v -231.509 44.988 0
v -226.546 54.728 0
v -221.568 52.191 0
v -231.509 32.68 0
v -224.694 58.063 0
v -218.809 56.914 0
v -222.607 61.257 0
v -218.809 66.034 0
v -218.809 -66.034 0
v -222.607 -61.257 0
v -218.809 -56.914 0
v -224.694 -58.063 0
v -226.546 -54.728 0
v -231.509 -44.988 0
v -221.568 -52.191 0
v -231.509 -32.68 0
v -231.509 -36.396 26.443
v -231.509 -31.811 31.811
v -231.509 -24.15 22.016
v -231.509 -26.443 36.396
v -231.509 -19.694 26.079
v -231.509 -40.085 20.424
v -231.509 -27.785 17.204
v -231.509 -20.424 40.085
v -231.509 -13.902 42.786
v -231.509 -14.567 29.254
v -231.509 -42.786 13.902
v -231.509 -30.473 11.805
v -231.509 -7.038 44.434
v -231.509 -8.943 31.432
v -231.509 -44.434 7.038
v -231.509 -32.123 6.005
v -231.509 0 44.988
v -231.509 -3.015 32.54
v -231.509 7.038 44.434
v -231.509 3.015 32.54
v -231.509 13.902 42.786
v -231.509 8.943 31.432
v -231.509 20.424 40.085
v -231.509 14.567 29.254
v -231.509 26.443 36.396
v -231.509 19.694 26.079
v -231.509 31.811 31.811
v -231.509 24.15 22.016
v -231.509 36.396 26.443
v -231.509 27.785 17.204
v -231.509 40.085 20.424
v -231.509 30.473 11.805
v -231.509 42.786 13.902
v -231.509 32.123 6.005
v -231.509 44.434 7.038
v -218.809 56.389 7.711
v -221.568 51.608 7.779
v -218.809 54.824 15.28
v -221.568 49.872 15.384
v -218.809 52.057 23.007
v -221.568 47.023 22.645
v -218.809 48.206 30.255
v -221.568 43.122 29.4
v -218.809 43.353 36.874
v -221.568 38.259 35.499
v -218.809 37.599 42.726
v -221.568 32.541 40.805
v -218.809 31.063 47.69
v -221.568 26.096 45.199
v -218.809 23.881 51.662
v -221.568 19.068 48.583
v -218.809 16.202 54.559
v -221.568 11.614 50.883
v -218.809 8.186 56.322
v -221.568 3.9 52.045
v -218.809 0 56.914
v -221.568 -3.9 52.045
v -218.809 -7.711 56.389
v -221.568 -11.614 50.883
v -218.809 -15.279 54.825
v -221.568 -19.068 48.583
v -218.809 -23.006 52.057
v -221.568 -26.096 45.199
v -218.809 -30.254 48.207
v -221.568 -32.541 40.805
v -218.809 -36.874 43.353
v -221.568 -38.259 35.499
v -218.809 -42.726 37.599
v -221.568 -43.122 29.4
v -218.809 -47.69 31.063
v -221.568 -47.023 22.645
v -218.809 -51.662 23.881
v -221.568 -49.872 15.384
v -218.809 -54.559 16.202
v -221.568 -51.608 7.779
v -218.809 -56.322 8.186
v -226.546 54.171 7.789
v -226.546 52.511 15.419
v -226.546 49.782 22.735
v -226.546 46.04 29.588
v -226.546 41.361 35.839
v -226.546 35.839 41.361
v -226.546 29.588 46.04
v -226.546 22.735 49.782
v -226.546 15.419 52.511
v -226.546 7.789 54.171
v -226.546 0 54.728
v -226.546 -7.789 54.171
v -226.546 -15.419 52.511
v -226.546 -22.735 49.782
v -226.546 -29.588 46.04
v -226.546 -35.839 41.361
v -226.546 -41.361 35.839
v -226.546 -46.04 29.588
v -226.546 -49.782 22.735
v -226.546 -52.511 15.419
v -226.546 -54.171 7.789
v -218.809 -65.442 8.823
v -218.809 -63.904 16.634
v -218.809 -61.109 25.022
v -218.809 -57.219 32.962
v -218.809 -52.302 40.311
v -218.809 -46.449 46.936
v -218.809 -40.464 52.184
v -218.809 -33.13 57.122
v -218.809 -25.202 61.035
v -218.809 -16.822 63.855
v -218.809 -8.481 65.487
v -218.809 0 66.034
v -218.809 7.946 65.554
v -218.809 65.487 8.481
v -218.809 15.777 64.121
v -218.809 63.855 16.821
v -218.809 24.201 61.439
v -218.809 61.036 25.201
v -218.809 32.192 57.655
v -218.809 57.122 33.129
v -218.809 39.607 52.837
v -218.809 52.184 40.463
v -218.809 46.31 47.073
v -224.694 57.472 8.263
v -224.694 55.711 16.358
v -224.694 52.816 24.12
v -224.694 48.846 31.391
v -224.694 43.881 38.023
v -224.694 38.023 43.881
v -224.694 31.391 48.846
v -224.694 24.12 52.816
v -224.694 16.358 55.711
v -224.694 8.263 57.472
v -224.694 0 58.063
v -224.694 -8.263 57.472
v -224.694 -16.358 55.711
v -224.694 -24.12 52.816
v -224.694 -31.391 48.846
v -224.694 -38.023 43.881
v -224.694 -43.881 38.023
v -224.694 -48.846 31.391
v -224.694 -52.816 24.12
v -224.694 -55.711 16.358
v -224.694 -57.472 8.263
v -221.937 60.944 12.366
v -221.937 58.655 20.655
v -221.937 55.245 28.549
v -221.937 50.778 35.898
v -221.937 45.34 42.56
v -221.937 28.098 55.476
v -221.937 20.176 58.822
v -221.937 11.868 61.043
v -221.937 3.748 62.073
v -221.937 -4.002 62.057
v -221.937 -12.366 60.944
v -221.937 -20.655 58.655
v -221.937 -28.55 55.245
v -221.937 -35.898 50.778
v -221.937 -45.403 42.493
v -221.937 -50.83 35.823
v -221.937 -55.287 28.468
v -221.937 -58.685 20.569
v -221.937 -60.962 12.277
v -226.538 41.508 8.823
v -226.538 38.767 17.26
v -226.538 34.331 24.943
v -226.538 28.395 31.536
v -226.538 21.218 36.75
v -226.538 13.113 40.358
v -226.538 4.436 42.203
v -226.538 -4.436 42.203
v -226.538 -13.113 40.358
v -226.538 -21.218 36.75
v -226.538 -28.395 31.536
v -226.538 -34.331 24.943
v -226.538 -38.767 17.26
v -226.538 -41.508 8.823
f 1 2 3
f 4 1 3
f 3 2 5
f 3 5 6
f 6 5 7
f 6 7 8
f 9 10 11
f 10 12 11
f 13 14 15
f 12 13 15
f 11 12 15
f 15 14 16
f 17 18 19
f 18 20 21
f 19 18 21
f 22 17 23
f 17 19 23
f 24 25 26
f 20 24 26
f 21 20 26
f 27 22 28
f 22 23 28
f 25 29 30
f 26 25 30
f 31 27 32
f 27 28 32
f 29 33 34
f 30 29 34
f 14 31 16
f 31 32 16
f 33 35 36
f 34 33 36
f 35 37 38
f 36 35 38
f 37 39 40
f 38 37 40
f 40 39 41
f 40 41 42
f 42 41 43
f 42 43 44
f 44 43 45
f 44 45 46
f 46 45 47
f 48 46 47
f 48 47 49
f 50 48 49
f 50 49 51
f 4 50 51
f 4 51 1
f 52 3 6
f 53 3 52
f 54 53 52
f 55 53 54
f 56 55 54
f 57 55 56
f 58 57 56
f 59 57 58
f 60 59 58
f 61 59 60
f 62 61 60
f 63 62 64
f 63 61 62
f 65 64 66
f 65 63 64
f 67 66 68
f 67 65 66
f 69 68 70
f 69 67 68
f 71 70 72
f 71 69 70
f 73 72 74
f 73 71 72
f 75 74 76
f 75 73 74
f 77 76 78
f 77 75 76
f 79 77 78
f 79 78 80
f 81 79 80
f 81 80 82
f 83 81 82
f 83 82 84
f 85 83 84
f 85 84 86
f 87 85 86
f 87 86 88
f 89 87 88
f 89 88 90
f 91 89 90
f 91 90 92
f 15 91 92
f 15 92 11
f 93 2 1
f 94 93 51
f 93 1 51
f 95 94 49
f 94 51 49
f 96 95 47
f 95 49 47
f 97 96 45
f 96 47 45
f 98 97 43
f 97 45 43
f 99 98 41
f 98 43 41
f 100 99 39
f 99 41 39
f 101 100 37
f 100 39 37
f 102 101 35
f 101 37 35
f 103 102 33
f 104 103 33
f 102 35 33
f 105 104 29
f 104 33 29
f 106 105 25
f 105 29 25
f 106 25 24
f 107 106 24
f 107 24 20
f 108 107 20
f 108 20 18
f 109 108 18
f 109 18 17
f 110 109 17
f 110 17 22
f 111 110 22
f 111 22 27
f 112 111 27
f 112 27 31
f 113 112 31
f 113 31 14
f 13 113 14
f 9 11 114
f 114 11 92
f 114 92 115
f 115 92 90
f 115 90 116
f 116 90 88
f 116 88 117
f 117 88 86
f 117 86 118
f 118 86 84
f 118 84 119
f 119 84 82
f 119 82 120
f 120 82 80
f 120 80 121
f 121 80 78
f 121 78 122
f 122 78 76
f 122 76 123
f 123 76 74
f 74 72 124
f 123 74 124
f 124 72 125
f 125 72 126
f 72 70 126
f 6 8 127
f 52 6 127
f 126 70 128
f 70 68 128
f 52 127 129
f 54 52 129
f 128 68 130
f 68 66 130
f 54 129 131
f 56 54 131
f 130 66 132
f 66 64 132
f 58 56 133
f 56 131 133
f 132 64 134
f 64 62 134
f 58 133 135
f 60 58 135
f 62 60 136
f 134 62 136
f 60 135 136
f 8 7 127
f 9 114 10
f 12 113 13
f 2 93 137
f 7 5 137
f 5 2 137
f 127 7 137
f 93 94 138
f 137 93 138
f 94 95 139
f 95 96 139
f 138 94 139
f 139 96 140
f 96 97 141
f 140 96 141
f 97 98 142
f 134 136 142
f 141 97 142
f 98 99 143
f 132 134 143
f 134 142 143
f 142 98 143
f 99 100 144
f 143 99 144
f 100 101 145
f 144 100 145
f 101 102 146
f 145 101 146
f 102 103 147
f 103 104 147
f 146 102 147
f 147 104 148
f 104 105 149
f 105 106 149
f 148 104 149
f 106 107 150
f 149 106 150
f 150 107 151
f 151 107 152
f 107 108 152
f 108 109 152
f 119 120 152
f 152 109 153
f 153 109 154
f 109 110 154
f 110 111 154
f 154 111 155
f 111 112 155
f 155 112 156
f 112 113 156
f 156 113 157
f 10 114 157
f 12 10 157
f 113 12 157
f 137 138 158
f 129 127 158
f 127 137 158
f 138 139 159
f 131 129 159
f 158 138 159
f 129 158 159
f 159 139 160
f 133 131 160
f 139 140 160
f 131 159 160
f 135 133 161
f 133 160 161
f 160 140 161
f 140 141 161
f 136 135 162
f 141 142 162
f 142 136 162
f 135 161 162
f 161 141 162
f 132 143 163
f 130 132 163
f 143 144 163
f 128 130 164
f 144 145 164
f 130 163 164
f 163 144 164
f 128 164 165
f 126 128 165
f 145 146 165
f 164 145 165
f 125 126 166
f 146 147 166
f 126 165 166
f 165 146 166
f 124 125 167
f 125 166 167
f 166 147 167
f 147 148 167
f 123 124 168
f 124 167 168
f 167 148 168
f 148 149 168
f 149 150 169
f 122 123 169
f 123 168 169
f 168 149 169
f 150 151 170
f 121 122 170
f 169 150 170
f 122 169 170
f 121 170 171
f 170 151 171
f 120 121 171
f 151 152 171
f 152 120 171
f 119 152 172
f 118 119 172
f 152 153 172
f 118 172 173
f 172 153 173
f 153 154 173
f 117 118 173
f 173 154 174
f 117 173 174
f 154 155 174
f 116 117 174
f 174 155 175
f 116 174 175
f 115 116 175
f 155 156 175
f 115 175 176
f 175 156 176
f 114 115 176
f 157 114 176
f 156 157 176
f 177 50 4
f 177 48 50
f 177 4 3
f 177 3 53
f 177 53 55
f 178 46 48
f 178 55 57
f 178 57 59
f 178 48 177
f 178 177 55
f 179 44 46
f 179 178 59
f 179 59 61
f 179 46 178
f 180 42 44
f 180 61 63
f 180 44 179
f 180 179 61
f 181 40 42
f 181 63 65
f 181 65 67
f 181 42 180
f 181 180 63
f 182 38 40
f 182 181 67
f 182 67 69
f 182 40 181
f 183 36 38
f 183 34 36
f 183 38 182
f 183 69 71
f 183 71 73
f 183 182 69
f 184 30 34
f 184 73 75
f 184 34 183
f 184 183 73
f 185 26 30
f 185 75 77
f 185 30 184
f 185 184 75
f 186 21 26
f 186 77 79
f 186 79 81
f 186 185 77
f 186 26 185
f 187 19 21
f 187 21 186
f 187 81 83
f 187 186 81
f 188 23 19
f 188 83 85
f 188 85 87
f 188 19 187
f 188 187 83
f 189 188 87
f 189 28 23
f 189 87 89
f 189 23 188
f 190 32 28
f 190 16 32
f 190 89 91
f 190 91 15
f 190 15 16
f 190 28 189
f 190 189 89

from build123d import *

# Parameters (mm, degrees)
SCALE1_SCALE       = 649.76746201
SHELL2_T           = 5.588
SKETCH3_R          = 101.6
SKETCH3_R_2        = 66.04
CUT_EXTRUDE2_DEPTH = 535.742534837
CUT_EXTRUDE3_START = -41.91
SKETCH4_R          = 92.04718224
CUT_EXTRUDE3_DEPTH = 41.91
CUT_EXTRUDE4_START = -12.7
SKETCH5_R          = 73.005644817
CUT_EXTRUDE4_DEPTH = 50.8
SKETCH6_W          = 424.059423161
SKETCH6_H          = 690.342462677
CUT_EXTRUDE5_DEPTH = 250.634607617


with BuildPart() as part:
    # Sketch1 → Revolve2 (revolve)
    with BuildSketch(Plane.XY, mode=Mode.PRIVATE) as revolve2_sk:
        with BuildLine():
            Line((0.30325, 0.129), (-0.275595218, 0.129))
            ThreePointArc((-0.275595218, 0.129), (-0.3184401, 0.116916493), (-0.348657753, 0.084227221))
            Line((-0.348657753, 0.084227221), (-0.372858421, 0.036730735))
            ThreePointArc((-0.372858421, 0.036730735), (-0.374701425, 0.034736985), (-0.377314576, 0.034))
            Line((-0.377314576, 0.034), (-0.40125, 0.034))
            Line((-0.40125, 0.034), (-0.40125, 0))
            Line((-0.40125, 0), (0.40125, 0))
            Line((0.40125, 0), (0.40125, 0.000587576))
            ThreePointArc((0.40125, 0.000587576), (0.399958659, 0.015347671), (0.396123873, 0.029659288))
            Line((0.396123873, 0.029659288), (0.379365102, 0.075703632))
            ThreePointArc((0.379365102, 0.075703632), (0.349709691, 0.114351316), (0.30325, 0.129))
        make_face()
    revolve(revolve2_sk.sketch.rotate(Axis((-0.40125, 0, 0), (1, 0, 0)), 90), axis=Axis((-0.40125, 0, 0), (1, 0, 0)))


with BuildPart() as part_1:
    # Scale1: scaled about (0, 0, 0)
    add(part.part.scale(SCALE1_SCALE))

    # Shell2 (no face opened: a closed hollow body)
    add(offset(amount=-SHELL2_T, mode=Mode.PRIVATE), mode=Mode.SUBTRACT)

    # Sketch3 → Cut-Extrude2 (cut, through all)
    with BuildSketch(Plane.ZY.offset(260.719194132)):
        Circle(SKETCH3_R)
        with Locations(Location((0, 0, 0), (0, 0, 180))):
            Circle(SKETCH3_R_2, mode=Mode.SUBTRACT)
    extrude(amount=-CUT_EXTRUDE2_DEPTH, mode=Mode.SUBTRACT)


with BuildPart() as body_2:
    # of the pieces the cut leaves, the one that is kept (cut_extrude2_keep)
    add(part_1.part.solids().sort_by_distance((-218.803671245, 0, 66.04))[0])

    # Sketch4 → Cut-Extrude3 (cut)
    with BuildSketch(Plane.ZY.offset(260.719194132).offset(CUT_EXTRUDE3_START)):
        Circle(SKETCH4_R)
    extrude(amount=-CUT_EXTRUDE3_DEPTH, mode=Mode.SUBTRACT)

    # Sketch5 → Cut-Extrude4 (cut)
    with BuildSketch(Plane(origin=(-218.809194132, 0, 0), x_dir=(0, 0, -1), z_dir=(1, 0, 0)).offset(CUT_EXTRUDE4_START)):
        Circle(SKETCH5_R)
    extrude(amount=-CUT_EXTRUDE4_DEPTH, mode=Mode.SUBTRACT)

    # Sketch6 → Cut-Extrude5 (cut, through all)
    with BuildSketch(Plane.XY):
        with Locations((-333.697276698, 135.370996171)):
            Rectangle(SKETCH6_W, SKETCH6_H)
    extrude(amount=-CUT_EXTRUDE5_DEPTH, mode=Mode.SUBTRACT)


solid = body_2.part
